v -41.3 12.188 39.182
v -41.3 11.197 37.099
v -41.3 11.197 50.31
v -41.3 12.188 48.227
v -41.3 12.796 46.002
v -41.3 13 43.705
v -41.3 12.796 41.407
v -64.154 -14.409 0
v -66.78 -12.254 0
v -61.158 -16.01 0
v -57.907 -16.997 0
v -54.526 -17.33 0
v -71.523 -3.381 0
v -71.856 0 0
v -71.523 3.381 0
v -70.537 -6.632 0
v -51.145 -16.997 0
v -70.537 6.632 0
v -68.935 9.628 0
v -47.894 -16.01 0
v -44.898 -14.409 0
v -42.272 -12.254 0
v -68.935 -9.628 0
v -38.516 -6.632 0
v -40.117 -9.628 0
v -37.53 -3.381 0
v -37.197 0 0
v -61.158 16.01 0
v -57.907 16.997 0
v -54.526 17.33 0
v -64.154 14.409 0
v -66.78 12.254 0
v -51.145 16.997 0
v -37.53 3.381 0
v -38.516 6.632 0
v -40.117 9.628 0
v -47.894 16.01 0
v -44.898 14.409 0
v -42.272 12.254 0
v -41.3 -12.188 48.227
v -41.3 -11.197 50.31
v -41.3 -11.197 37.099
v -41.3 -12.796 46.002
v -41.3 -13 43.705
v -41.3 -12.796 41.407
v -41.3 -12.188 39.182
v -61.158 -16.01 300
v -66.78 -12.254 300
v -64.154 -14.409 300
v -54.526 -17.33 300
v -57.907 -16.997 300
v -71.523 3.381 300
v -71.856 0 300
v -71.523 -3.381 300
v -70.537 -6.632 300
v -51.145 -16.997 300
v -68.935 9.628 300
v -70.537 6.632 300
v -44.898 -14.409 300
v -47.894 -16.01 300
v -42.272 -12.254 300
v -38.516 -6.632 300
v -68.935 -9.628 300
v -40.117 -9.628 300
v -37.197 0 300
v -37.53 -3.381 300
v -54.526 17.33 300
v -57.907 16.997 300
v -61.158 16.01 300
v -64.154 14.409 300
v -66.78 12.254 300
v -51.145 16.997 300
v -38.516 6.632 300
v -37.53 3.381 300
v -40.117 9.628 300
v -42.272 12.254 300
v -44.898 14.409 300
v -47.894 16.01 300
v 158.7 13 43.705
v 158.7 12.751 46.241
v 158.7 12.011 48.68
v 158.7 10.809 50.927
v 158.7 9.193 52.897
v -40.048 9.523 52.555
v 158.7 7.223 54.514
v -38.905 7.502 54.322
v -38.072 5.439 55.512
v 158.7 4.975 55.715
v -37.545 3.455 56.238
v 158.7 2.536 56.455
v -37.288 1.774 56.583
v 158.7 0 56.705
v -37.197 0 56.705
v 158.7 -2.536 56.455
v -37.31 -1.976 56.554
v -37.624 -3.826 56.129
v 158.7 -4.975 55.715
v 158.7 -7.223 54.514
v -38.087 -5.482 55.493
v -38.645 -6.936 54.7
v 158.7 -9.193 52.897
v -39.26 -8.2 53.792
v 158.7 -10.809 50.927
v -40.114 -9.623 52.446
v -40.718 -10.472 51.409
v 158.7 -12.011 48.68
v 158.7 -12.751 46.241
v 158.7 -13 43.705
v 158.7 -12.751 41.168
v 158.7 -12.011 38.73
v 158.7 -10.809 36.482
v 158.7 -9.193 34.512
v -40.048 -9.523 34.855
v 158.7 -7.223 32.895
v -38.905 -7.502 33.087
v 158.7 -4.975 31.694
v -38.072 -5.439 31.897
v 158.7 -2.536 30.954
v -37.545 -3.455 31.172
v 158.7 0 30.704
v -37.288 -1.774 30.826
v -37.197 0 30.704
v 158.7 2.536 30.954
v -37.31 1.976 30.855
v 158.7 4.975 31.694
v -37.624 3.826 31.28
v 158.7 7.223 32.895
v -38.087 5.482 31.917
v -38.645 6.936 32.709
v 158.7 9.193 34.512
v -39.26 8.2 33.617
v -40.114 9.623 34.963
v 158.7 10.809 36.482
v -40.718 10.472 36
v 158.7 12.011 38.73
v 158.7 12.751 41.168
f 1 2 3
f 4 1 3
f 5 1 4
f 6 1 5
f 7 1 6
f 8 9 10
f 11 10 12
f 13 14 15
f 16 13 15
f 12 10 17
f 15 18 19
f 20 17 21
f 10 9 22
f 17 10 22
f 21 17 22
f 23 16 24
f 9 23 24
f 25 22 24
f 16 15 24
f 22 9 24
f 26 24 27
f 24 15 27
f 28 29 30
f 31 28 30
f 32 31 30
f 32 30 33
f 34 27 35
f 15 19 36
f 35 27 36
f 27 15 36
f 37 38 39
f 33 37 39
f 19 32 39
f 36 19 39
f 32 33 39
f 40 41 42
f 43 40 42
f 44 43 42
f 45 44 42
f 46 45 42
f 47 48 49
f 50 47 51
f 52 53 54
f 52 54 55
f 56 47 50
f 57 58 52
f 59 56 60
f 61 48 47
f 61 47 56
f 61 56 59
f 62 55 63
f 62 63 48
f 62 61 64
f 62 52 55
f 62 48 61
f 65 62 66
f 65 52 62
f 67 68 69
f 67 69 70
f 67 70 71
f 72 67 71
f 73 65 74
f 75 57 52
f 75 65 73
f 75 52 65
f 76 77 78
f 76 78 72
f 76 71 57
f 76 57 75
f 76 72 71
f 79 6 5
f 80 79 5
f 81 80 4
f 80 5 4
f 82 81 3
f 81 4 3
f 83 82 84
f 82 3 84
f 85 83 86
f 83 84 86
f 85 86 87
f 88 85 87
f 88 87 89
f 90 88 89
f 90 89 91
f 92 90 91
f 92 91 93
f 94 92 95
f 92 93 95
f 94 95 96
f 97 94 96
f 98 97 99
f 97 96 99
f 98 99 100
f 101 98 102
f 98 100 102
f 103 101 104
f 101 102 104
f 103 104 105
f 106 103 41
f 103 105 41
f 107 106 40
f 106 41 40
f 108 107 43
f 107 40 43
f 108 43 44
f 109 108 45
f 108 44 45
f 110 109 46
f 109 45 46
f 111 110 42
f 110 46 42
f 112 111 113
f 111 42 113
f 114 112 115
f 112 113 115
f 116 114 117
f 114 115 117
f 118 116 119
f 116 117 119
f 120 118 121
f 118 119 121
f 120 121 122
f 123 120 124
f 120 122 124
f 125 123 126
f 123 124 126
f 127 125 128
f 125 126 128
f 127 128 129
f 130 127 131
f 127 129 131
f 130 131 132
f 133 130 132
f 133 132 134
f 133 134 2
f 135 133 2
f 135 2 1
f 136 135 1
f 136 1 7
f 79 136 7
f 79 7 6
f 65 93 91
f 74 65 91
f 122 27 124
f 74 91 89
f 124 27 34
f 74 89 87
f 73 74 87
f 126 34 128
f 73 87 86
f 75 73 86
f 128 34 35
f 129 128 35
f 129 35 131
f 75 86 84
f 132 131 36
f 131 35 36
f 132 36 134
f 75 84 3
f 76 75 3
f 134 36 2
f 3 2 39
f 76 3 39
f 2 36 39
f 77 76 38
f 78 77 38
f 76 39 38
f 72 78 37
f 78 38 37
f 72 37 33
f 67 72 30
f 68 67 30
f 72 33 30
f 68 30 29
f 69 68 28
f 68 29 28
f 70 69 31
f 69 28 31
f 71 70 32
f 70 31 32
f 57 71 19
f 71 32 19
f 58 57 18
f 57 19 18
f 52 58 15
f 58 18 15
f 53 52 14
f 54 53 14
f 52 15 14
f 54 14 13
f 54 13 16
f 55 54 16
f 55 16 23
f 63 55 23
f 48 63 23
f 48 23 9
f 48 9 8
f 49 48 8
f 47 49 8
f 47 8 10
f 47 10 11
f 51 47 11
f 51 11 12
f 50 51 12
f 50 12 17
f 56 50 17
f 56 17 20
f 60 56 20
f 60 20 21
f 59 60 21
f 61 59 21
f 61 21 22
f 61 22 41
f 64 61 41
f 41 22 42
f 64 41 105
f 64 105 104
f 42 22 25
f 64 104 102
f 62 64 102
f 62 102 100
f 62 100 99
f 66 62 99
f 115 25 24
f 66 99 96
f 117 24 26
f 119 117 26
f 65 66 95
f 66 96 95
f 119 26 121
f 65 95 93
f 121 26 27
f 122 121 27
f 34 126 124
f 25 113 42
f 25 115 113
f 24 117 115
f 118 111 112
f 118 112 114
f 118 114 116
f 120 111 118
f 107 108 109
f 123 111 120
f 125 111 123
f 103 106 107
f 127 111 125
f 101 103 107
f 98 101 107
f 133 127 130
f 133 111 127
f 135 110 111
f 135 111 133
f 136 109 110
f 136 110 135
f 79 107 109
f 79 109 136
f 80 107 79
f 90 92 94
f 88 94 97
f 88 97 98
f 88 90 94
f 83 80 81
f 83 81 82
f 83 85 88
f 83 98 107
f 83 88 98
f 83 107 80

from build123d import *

# Parameters (mm, degrees)
F0_R     = 17.329579
F1_DEPTH = 300
F3_R     = 13.000421
F4_DEPTH = 200


with BuildPart() as f1:
    # F0 (on Top) → F1 (new body)
    with BuildSketch(Plane.XY):
        with Locations((-54.526214, 0)):
            Circle(F0_R)
    extrude(amount=F1_DEPTH)

    # F3 (on offset) → F4 (join)
    with BuildSketch(Plane.YZ.offset(-41.3)):
        with Locations((0, 43.704636)):
            Circle(F3_R)
    extrude(amount=F4_DEPTH)


solid = f1.part
